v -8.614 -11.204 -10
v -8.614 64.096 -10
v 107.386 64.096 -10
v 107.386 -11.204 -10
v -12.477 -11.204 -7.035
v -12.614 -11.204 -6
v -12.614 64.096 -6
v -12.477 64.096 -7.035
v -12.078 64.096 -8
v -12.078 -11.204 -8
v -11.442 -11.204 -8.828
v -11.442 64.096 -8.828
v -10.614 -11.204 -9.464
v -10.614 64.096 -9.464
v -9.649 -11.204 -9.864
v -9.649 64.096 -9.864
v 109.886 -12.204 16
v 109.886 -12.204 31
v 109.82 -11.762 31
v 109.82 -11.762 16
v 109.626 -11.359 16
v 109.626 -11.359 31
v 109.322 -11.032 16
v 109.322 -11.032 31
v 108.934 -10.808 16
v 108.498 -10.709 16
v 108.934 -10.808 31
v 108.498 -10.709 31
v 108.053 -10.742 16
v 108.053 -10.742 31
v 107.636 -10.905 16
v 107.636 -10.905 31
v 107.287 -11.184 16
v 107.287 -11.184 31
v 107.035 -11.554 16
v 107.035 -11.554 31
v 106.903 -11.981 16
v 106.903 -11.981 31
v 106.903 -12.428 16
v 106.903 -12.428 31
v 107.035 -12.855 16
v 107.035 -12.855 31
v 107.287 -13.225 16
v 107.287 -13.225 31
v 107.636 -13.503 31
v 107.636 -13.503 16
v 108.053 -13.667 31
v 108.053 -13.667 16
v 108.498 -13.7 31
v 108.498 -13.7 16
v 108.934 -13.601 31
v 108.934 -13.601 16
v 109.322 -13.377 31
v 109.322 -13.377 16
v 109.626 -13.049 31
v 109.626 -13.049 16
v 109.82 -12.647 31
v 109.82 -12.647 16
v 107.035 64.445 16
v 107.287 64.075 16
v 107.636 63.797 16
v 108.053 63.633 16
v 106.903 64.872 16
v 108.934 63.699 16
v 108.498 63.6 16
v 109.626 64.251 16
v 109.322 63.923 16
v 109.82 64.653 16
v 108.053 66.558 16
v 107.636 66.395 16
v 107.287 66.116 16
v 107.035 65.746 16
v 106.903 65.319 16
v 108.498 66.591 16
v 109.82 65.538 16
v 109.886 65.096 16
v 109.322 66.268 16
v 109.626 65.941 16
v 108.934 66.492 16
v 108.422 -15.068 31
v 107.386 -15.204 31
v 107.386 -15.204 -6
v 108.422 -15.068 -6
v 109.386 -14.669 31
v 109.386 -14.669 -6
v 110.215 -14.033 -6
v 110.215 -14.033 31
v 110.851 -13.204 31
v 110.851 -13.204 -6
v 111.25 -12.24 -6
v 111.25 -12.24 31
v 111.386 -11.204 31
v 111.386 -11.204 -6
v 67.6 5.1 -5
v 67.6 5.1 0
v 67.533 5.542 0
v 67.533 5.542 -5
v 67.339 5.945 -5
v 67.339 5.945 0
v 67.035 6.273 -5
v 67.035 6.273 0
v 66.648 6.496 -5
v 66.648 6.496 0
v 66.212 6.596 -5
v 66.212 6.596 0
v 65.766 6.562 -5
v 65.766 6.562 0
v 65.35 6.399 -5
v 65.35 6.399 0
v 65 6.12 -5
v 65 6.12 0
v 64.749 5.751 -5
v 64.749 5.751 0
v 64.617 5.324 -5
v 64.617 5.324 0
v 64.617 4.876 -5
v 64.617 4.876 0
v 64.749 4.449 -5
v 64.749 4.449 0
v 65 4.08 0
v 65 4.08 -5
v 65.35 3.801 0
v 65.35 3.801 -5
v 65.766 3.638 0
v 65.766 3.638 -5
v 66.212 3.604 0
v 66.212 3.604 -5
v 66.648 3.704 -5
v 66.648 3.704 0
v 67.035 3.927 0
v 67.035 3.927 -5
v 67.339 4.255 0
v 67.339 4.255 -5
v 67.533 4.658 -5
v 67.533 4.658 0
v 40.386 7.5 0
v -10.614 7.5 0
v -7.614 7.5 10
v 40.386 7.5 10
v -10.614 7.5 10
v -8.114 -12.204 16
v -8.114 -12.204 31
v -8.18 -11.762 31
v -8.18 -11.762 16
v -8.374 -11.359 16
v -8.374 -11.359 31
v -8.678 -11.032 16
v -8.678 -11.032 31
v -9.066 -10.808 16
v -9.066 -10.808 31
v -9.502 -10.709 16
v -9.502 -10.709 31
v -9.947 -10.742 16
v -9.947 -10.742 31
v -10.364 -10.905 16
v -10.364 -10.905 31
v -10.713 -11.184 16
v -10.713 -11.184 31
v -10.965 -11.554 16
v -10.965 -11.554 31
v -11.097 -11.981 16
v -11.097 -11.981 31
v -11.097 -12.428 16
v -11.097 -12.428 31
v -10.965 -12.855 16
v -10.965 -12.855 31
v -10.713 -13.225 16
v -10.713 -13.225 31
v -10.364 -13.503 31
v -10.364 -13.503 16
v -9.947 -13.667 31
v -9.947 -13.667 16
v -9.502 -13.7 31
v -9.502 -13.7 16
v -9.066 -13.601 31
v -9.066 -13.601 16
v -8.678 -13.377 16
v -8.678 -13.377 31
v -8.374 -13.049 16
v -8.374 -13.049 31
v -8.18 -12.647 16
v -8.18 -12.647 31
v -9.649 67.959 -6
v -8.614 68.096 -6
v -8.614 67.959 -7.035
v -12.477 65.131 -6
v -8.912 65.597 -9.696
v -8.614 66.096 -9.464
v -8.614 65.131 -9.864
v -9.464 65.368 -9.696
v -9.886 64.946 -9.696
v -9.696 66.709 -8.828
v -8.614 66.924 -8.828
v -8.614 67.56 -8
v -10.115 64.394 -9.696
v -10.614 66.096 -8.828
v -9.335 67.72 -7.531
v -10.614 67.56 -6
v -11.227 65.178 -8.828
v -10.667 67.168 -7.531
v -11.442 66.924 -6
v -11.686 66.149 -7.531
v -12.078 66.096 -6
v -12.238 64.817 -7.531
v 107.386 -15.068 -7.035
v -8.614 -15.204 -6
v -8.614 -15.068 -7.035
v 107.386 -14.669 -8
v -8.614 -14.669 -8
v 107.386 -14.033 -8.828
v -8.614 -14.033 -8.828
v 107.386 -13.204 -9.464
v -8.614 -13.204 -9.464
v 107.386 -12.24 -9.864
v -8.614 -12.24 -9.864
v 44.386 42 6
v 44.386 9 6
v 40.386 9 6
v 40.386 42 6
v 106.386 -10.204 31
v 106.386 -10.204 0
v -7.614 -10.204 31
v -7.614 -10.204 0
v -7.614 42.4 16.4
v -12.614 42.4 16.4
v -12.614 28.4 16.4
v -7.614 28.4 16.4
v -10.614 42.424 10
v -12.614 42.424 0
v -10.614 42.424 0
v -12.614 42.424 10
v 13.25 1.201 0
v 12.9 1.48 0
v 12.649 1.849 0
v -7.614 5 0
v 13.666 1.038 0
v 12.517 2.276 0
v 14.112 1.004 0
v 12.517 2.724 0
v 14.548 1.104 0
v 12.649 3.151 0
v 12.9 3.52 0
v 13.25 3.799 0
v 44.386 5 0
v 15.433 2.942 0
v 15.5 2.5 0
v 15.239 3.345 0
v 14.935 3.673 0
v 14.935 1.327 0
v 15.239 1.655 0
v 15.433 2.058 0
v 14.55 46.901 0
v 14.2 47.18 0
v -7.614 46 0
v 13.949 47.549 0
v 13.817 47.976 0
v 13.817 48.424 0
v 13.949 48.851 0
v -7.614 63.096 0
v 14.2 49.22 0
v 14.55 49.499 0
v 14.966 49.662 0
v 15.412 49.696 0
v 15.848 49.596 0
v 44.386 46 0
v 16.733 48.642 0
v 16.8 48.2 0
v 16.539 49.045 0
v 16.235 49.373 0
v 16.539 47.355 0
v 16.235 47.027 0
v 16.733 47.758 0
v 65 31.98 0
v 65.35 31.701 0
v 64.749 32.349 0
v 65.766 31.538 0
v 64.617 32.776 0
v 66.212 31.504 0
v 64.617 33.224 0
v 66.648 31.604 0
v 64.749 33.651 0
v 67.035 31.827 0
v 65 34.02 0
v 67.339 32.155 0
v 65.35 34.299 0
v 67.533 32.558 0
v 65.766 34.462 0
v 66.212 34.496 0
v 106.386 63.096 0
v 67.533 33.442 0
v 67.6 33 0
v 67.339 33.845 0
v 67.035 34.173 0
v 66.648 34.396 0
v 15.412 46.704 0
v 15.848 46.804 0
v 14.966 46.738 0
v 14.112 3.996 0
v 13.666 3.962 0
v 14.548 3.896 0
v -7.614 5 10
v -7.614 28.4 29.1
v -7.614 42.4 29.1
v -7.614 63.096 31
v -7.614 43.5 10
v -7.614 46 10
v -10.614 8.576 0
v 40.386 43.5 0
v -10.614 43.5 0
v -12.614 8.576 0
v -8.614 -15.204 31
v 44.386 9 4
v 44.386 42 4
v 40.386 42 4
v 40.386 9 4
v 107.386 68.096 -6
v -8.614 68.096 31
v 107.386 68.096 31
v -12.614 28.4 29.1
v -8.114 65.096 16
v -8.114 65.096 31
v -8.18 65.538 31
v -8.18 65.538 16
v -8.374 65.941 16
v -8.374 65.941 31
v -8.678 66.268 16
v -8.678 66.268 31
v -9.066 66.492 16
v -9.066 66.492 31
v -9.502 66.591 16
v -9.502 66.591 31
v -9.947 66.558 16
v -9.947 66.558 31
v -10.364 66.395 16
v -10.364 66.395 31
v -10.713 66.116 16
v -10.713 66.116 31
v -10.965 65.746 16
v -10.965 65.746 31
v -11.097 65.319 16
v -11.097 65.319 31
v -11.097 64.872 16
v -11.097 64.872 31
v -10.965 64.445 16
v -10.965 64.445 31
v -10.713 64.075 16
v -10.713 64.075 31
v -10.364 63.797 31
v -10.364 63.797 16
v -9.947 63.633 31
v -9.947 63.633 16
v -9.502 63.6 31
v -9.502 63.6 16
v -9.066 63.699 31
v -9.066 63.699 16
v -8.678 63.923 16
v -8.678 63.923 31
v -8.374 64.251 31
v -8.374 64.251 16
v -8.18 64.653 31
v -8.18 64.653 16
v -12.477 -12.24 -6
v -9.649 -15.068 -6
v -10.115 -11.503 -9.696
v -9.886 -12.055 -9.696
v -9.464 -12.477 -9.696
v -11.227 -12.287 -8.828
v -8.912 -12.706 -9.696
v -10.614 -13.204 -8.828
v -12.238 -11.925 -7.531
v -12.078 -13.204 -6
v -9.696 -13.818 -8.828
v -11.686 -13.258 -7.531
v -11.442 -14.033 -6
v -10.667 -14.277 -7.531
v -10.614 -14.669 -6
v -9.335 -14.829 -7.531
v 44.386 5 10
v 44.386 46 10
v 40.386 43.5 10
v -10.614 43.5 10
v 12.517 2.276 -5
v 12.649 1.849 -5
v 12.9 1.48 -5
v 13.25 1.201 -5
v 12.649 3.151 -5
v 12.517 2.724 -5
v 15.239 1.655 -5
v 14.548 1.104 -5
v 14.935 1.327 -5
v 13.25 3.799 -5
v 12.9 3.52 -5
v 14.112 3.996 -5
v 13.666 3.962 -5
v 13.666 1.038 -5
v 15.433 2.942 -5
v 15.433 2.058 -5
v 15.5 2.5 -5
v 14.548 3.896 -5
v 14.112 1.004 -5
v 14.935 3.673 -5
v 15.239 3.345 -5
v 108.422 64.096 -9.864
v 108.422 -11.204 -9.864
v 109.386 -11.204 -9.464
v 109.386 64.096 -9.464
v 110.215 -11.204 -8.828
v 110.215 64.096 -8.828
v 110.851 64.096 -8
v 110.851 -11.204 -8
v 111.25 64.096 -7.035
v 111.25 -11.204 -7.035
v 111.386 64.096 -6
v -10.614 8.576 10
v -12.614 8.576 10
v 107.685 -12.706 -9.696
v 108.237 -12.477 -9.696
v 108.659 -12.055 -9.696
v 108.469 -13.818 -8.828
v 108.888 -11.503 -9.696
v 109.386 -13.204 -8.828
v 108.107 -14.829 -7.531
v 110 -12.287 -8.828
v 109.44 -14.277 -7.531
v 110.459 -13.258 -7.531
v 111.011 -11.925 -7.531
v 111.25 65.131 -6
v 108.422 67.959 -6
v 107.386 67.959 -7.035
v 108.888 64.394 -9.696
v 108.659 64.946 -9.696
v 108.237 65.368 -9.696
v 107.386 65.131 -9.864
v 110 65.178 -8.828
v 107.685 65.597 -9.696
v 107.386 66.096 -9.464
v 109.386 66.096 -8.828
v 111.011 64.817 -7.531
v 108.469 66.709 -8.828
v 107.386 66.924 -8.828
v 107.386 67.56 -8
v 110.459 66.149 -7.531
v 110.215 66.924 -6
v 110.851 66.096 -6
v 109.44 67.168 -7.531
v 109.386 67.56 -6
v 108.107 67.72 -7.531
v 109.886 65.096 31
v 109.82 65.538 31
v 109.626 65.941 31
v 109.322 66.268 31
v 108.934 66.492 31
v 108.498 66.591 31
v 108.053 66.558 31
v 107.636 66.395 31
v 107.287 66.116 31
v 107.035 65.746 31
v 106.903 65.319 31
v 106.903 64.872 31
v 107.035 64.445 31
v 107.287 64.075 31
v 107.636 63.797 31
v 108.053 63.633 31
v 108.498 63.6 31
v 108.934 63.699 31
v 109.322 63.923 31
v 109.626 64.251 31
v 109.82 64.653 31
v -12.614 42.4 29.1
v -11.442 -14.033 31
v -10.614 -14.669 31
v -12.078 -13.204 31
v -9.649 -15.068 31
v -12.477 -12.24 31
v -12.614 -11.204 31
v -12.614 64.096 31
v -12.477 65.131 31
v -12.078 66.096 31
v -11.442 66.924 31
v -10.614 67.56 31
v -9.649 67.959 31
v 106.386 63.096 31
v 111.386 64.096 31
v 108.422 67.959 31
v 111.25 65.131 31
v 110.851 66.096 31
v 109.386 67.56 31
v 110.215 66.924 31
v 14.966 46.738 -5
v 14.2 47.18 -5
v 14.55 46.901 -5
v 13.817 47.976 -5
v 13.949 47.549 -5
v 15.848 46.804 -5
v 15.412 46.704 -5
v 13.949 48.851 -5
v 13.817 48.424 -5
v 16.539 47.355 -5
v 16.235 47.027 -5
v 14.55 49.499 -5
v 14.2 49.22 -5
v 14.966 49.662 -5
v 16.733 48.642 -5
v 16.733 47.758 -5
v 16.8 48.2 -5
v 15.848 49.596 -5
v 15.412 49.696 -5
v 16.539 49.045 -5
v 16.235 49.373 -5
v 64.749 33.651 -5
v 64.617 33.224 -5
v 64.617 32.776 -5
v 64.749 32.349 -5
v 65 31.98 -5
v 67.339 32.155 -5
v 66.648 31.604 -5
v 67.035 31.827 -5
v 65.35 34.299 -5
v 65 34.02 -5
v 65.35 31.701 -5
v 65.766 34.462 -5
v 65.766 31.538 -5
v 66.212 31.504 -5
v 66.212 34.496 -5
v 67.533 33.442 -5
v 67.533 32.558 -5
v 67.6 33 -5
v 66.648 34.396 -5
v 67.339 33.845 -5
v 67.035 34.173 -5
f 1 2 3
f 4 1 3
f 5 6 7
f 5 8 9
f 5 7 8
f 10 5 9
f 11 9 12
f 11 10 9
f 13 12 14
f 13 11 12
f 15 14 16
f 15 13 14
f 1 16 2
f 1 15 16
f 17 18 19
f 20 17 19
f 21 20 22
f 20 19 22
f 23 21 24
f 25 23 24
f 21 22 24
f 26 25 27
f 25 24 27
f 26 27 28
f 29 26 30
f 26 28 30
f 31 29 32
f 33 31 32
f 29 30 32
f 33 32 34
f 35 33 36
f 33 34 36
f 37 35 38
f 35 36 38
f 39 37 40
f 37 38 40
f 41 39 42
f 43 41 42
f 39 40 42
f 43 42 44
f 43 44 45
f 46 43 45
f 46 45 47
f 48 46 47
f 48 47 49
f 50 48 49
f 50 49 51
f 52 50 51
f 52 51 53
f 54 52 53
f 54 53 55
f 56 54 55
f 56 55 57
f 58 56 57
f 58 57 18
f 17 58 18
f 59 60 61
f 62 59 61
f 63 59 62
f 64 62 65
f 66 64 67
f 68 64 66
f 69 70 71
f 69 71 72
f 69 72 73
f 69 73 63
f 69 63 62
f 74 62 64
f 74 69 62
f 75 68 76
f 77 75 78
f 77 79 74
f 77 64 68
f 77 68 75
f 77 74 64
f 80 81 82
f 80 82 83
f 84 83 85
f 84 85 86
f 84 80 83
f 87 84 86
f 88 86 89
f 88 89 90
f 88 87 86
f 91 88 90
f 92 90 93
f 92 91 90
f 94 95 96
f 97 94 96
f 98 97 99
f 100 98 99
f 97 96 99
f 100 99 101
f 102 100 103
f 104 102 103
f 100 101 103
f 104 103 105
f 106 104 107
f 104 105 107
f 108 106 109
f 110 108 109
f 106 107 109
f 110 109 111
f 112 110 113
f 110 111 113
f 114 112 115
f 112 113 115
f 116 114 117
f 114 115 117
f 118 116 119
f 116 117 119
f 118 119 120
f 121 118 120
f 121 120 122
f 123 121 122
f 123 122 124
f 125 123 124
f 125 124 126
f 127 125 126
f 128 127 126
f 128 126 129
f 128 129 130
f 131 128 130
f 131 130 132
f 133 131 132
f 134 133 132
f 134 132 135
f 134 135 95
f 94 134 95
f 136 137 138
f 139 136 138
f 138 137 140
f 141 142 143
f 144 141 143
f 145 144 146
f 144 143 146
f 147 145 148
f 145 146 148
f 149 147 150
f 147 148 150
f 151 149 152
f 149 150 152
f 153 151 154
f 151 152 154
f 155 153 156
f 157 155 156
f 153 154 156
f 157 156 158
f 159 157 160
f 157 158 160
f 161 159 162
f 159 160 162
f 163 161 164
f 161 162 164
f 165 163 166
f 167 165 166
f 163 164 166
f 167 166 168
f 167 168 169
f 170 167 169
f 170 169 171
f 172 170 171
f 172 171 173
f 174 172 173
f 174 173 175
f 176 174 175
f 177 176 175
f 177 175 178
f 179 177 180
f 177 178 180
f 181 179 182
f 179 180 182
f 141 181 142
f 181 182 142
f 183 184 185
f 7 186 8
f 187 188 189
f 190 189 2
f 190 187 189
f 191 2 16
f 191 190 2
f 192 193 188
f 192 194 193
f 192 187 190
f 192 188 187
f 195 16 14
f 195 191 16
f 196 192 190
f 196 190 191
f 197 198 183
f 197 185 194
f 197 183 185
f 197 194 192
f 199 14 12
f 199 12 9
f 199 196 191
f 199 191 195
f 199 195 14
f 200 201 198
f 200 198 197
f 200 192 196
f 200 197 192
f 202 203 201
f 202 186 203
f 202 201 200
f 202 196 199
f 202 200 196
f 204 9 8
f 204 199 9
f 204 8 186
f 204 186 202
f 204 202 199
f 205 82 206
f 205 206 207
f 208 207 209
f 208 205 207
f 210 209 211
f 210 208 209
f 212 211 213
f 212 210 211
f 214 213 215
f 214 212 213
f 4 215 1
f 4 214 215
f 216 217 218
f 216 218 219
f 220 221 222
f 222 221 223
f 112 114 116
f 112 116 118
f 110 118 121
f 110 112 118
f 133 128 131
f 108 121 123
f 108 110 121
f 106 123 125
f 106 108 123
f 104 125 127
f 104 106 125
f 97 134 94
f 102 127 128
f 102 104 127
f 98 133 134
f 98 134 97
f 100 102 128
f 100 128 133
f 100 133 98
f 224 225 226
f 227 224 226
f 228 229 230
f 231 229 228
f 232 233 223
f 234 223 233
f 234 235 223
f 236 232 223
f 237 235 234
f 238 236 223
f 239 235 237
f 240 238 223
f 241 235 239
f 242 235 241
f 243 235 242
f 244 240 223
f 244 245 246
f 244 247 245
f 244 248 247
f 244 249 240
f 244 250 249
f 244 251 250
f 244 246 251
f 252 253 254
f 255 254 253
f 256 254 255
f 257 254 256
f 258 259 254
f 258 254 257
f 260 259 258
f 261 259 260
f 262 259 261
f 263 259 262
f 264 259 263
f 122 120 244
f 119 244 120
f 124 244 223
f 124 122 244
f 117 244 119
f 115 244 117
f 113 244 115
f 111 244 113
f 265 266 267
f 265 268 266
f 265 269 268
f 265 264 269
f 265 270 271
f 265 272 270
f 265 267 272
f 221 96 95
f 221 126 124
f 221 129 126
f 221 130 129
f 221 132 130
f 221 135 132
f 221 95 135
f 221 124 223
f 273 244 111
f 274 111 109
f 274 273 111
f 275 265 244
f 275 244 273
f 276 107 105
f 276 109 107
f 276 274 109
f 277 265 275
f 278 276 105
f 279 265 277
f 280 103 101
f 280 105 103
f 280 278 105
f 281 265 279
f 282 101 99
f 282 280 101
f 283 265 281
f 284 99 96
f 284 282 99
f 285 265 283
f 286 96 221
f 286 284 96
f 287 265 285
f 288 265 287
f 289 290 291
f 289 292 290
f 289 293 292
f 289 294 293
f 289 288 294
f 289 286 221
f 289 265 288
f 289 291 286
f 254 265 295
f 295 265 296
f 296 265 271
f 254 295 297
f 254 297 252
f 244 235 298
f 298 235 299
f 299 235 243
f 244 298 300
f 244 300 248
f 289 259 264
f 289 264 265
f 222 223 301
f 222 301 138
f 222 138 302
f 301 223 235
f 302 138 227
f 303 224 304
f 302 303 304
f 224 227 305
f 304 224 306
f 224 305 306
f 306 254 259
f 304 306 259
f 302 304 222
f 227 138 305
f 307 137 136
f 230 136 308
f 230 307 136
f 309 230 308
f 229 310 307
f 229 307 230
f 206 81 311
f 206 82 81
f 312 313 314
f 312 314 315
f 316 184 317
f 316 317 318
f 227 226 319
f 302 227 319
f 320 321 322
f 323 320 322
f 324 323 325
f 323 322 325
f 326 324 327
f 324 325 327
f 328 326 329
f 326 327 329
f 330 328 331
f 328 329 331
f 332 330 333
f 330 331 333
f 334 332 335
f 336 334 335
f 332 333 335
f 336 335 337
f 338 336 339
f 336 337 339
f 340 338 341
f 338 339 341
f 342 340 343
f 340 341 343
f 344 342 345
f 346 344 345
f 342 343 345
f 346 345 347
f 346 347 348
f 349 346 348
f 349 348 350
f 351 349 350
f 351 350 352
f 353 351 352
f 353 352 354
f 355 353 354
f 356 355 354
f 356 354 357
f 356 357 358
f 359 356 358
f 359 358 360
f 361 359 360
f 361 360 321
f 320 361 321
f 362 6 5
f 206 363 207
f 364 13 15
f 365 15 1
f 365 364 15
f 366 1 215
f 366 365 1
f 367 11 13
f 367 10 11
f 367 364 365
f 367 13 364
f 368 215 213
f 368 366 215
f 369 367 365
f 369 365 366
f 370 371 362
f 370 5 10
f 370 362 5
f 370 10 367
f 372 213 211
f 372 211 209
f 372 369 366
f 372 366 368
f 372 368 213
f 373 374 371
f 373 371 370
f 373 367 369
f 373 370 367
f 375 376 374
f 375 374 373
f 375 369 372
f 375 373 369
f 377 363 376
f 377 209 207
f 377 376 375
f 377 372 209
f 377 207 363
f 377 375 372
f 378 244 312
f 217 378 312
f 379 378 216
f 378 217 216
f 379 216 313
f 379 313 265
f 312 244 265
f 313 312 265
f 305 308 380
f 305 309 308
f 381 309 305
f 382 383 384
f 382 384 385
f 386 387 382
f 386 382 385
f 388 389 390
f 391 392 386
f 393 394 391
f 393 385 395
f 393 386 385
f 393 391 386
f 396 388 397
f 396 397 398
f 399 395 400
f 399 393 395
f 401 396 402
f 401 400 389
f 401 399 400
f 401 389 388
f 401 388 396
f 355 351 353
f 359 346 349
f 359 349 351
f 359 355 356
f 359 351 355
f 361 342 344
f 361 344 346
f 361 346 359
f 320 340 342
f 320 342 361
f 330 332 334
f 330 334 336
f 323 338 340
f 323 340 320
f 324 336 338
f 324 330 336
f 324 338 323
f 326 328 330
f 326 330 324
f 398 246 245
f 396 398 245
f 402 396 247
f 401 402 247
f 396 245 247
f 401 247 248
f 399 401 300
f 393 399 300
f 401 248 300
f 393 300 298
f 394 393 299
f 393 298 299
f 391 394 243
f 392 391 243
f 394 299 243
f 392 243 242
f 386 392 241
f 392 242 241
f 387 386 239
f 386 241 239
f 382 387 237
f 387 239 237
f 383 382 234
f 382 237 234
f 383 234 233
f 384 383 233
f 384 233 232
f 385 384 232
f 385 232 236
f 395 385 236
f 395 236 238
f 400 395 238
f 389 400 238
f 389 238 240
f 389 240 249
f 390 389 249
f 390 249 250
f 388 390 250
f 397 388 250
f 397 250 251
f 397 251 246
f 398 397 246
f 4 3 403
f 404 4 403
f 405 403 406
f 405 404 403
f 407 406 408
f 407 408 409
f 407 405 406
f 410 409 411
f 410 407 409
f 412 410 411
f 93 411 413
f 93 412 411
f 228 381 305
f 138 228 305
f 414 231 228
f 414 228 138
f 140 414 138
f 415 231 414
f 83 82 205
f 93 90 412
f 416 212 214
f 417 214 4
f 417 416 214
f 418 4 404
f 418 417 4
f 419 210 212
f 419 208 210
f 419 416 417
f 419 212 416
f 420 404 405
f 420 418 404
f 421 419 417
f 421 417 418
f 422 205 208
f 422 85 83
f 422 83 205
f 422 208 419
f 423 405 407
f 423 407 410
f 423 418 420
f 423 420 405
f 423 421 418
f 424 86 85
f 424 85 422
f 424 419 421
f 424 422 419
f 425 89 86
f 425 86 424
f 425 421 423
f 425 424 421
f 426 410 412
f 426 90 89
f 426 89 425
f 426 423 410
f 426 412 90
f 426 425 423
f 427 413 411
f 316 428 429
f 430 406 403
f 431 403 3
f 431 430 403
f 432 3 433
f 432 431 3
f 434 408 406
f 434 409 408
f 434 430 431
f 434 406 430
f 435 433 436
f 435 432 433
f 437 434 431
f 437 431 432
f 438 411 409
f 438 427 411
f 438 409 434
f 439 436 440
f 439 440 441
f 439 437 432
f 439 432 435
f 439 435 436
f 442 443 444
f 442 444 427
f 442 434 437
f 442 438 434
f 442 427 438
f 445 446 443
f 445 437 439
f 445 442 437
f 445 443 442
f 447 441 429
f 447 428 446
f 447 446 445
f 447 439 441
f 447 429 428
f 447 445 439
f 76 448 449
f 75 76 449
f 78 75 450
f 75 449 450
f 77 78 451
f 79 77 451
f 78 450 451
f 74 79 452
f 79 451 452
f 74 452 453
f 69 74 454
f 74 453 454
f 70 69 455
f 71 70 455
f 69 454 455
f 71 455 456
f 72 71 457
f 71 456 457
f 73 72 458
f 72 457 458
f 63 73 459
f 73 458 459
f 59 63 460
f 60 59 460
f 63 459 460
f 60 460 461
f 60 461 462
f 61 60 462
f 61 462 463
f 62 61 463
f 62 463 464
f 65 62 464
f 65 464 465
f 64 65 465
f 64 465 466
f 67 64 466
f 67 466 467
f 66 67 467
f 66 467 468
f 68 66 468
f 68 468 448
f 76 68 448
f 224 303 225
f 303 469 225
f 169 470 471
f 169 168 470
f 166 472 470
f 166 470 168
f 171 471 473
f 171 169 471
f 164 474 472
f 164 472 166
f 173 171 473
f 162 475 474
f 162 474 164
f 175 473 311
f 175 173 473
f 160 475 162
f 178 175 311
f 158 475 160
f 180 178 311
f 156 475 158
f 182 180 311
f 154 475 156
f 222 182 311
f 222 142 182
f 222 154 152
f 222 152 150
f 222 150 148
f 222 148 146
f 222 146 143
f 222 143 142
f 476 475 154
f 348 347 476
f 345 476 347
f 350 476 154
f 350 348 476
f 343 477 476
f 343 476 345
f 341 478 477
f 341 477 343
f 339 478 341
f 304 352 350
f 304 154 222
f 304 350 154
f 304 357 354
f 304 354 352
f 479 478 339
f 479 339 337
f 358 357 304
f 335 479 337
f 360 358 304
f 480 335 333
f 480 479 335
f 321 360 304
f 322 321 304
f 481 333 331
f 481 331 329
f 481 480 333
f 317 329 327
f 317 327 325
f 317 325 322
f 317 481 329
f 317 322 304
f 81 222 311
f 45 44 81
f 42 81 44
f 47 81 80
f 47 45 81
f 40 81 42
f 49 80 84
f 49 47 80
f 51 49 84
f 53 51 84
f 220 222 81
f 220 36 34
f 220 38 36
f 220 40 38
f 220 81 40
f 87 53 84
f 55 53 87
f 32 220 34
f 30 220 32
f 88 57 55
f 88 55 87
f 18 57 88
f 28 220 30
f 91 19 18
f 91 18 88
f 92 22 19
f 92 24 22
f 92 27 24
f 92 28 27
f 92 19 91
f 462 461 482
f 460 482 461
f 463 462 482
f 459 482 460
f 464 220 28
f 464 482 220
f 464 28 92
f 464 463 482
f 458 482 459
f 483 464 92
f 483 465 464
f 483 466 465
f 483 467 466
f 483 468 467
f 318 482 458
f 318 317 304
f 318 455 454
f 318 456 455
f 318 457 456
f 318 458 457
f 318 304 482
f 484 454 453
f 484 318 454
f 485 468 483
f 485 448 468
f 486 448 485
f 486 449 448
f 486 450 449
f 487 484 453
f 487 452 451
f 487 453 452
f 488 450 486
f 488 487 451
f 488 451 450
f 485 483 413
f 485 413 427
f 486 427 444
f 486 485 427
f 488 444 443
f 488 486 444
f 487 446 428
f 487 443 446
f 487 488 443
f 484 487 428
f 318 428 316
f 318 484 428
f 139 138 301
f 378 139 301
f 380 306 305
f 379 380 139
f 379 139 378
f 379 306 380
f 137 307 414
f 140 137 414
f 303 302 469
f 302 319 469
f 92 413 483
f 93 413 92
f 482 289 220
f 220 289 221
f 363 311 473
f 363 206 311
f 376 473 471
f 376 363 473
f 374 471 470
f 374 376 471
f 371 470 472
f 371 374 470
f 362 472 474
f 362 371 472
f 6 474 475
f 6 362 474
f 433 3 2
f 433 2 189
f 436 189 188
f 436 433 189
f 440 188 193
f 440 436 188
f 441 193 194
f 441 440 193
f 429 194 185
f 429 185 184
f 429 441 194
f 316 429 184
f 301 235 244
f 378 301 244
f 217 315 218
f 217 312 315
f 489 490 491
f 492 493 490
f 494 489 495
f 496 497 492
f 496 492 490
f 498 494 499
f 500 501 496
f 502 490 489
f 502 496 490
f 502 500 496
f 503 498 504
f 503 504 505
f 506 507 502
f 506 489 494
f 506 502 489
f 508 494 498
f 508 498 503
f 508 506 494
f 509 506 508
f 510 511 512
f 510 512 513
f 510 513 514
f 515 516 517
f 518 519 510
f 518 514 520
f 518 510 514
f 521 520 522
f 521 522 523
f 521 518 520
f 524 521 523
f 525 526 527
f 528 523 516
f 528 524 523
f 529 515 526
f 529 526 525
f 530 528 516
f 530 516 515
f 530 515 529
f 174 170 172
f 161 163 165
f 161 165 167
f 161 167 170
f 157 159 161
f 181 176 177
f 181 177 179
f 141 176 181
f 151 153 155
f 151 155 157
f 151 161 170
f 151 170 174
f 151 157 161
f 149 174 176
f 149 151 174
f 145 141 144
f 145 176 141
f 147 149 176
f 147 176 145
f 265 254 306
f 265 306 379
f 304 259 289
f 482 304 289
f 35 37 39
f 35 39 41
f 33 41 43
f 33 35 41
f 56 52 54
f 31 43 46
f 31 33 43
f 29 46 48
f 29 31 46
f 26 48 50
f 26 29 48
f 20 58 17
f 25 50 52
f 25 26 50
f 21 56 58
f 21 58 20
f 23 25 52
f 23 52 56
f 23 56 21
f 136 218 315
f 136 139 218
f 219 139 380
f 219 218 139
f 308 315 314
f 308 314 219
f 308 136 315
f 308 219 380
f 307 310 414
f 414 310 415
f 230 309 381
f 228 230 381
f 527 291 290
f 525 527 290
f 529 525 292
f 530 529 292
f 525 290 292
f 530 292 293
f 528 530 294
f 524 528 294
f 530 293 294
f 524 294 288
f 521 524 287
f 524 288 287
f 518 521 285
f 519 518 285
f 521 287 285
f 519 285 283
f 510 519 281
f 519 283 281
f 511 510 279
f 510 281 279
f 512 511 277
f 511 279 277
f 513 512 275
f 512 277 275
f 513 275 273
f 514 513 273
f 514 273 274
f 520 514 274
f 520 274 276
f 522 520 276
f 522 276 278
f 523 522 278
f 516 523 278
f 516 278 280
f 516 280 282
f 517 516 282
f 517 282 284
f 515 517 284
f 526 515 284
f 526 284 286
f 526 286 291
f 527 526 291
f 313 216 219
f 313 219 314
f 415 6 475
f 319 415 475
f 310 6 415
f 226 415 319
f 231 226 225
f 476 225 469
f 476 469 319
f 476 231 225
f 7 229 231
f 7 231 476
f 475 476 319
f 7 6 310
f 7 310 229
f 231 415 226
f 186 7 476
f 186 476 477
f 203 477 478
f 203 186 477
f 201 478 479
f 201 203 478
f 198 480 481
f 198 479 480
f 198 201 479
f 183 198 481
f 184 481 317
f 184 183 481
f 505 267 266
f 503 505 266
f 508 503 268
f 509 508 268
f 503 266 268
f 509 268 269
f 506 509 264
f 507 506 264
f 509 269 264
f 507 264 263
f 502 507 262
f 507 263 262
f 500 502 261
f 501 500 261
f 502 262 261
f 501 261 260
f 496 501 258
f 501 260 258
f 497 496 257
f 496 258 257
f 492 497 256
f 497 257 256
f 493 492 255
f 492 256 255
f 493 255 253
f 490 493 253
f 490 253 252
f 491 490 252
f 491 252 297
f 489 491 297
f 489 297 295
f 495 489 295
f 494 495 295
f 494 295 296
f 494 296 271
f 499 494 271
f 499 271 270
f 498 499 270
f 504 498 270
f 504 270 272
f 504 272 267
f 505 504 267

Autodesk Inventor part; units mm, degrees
ref_plane "YZ Plane" through (0, 0, 0) normal (1, 0, 0) x (0, 1, 0)
ref_plane "XZ Plane" through (0, 0, 0) normal (0, 1, 0) x (-1, 0, 0)
ref_plane "XY Plane" through (0, 0, 0) normal (0, 0, 1) x (1, 0, 0)
sketch "Arduino Uno" plane through (0, 0, 0) normal (0, 0, 1) x (1, 0, 0)
  line L0 (0, 0) -> (68.6, 0)
  line L1 (68.6, 0) -> (68.6, 53.3)
  line L2 (68.6, 53.3) -> (0, 53.3)
  line L3 (0, 53.3) -> (0, 0)
  circle A0 centre (14, 2.5) radius 1.5
  circle A1 centre (66.1, 5.1) radius 1.5
  circle A2 centre (66.1, 33) radius 1.5
  circle A3 centre (15.3, 48.2) radius 1.5
  dimension "d6" = 68.6
  dimension "d7" = 53.3
  dimension "d97" = 3
  dimension "d98" = 14
  dimension "d99" = 2.5
  dimension "d100" = 3
  dimension "d101" = 5.1
  dimension "d102" = 66.1
  dimension "d103" = 33
  dimension "d105" = 66.1
  dimension "d106" = 3
  dimension "d107" = 3
  dimension "d108" = 48.2
  dimension "d109" = 15.3
sketch "Sketch2" plane through (0, 0, 0) normal (0, 0, 1) x (1, 0, 0)
  line L0 (-7.6136, -10.2044) -> (-7.6136, 63.0956)
  line L1 (-7.6136, 63.0956) -> (106.3864, 63.0956)
  line L2 (106.3864, 63.0956) -> (106.3864, -10.2044)
  line L3 (106.3864, -10.2044) -> (-7.6136, -10.2044)
  dimension "d29" = 114
  dimension "d39" = 73.3
extrude "Back Plate" add sketch "Sketch2" against normal blind 10
extrude "Uno Mounting Holes" cut sketch "Arduino Uno" against normal blind 5 contours A0 | A1 | A2 | A3
sketch "3.5\" TFT LCD Screen" plane through (0, 0, 0) normal (0, 0, 1) x (1, 0, 0)
  line L0 (88.6005, 0.0003) -> (88.6005, 53.3003)
  line L1 (88.6005, 53.3003) -> (10.6005, 53.3003)
  line L2 (10.6005, 53.3003) -> (10.6005, 0.0003)
  line L3 (10.6005, 0.0003) -> (88.6005, 0.0003)
  line L4 (-7.6136, -10.2044) -> (-7.6136, 63.0956) projected
  line L5 (106.3864, -10.2044) -> (-7.6136, -10.2044) projected
  line L6 (106.3864, 63.0956) -> (106.3864, -10.2044) projected
  line L7 (-7.6136, 63.0956) -> (106.3864, 63.0956) projected
  point P0 (0, 0)
  point P1 (68.6, 0)
  dimension "d35" = 78
  dimension "d36" = 53.3
  dimension "d37" = 78
  dimension "d38" = 53.3
sketch "SD Card Slot" plane through (0, 0, 0) normal (0, 0, 1) x (1, 0, 0)
  line L0 (43.3864, 9.1) -> (-7.6136, 9.1)
  line L1 (-7.6136, 9.1) -> (-7.6136, 44.1)
  line L2 (-7.6136, 44.1) -> (43.3864, 44.1)
  line L3 (43.3864, 44.1) -> (43.3864, 9.1)
  circle A0 centre (14, 2.5) radius 1.6 projected
  line L4 (-7.6136, -10.2044) -> (-7.6136, 63.0956) projected
  circle A1 centre (15.3, 50.7) radius 1.6 projected
  point P0 (0, 0)
  dimension "d41" = 35
  dimension "d42" = 51
  dimension "d44" = 6.6
  dimension "d45" = 0
sketch "Sketch5" plane through (0, 0, 0) normal (0, 0, 1) x (1, 0, 0)
  line L0 (43.3864, 9.1) -> (-7.6136, 9.1) projected
  line L1 (43.3864, 44.1) -> (43.3864, 9.1) projected
  line L2 (-7.6136, 44.1) -> (43.3864, 44.1) projected
  line L3 (-7.6136, 9.1) -> (-7.6136, 44.1) projected
  line L4 (40.3864, 7.5) -> (40.3864, 43.5)
  line L5 (40.3864, 7.5) -> (-7.6136, 7.5)
  line L6 (-7.6136, -10.2044) -> (-7.6136, 63.0956) projected
  line L7 (40.3864, 43.5) -> (-7.6136, 43.5)
  line L8 (-7.6136, 43.5) -> (-7.6136, 46)
  line L9 (-7.6136, 46) -> (44.3864, 46)
  line L10 (-7.6136, 7.5) -> (-7.6136, 5)
  line L11 (-7.6136, 5) -> (44.3864, 5)
  line L12 (44.3864, 5) -> (44.3864, 46)
  circle A0 centre (15.3, 48.2) radius 1.5 projected
  circle A1 centre (14, 2.5) radius 1.5 projected
  point P0 (0, 0)
  dimension "d47" = 2.5
  dimension "d48" = 52
  dimension "d49" = 2.5
  dimension "d115" = 41
  dimension "d116" = 36
  dimension "d117" = 1
extrude "SD Card Slot Slot" add sketch "Sketch5" along normal blind 10 contours L1 L2 L6 L9 L12 L11 L5 L4 L0 | L0 L4 L7 L3 L2 L1
sketch "Sketch6" plane through (44.3864, 5, 0) normal (1, 0, 0) x (0, 0, -1)
  line L0 (0, 41) -> (0, 0) projected
  line L1 (0, 41) -> (-10, 41) projected
  line L2 (-10, 0) -> (-10, 41) projected
  line L3 (0, 0) -> (-10, 0) projected
  line L4 (-6, 37) -> (-4, 37)
  line L5 (-4, 37) -> (-4, 4)
  line L6 (-4, 4) -> (-6, 4)
  line L7 (-6, 4) -> (-6, 37)
  point P0 (0, -5)
  dimension "d52" = 4
extrude "SD Ribbon Slot" cut sketch "Sketch6" against normal through all contours L4 L5 L6 L7
fillet "1.2mm Fillet" [suppressed]
sketch "Sketch7" plane through (0, 0, 0) normal (0, 0, 1) x (1, 0, 0)
  line L0 (106.3864, -10.2044) -> (101.3864, -10.2044)
  line L1 (101.3864, -10.2044) -> (101.3864, -5.2044)
  line L2 (101.3864, -5.2044) -> (106.3864, -5.2044)
  line L3 (106.3864, -5.2044) -> (106.3864, -10.2044)
  line L4 (49.3864, -10.2044) -> (49.3864, 80.0118)
  line L5 (-7.6136, 63.0956) -> (106.3864, 63.0956) projected
  line L6 (106.3864, 26.4456) -> (-34.6963, 26.4456)
  line L7 (-7.6136, -10.2044) -> (-2.6136, -10.2044)
  line L8 (-2.6136, -10.2044) -> (-2.6136, -5.2044)
  line L9 (-2.6136, -5.2044) -> (-7.6136, -5.2044)
  line L10 (-7.6136, -5.2044) -> (-7.6136, -10.2044)
  line L11 (106.3864, 63.0956) -> (101.3864, 63.0956)
  line L12 (101.3864, 63.0956) -> (101.3864, 58.0956)
  line L13 (101.3864, 58.0956) -> (106.3864, 58.0956)
  line L14 (106.3864, 58.0956) -> (106.3864, 63.0956)
  line L15 (-7.6136, 63.0956) -> (-2.6136, 63.0956)
  line L16 (-2.6136, 63.0956) -> (-2.6136, 58.0956)
  line L17 (-2.6136, 58.0956) -> (-7.6136, 58.0956)
  line L18 (-7.6136, 58.0956) -> (-7.6136, 63.0956)
  point P0 (0, 0)
  point P1 (0, 52.8913)
  dimension "d56" = 5
  dimension "d57" = 5
  dimension "d58" = 57
  dimension "d59" = 36.65
extrude "Pillars" [suppressed]
sketch "Sketch8" plane through (0, 0, 31) normal (0, 0, 1) x (1, 0, 0)
  line L0 (101.3864, -10.2044) -> (-2.6136, -10.2044) projected
  line L1 (-7.6136, -5.2044) -> (-2.6136, -5.2044) projected
  line L2 (101.3864, -10.2044) -> (-2.6136, -10.2044)
  line L3 (-2.6136, -10.2044) -> (-2.6136, -5.2044)
  line L4 (-2.6136, -5.2044) -> (101.3864, -5.2044)
  line L5 (101.3864, -5.2044) -> (101.3864, -10.2044)
  line L6 (101.3864, 63.0956) -> (101.3864, 58.0956) projected
  line L7 (106.3864, 63.0956) -> (106.3864, -10.2044) projected
  line L8 (101.3864, 58.0956) -> (106.3864, 58.0956)
  line L9 (106.3864, 58.0956) -> (106.3864, -5.2044)
  line L10 (106.3864, -5.2044) -> (101.3864, -5.2044)
  line L11 (101.3864, -5.2044) -> (101.3864, 58.0956)
  line L12 (-7.6136, 58.0956) -> (-2.6136, 58.0956) projected
  line L13 (-7.6136, 63.0956) -> (106.3864, 63.0956) projected
  line L14 (-2.6136, 58.0956) -> (101.3864, 58.0956)
  line L15 (101.3864, 58.0956) -> (101.3864, 63.0956)
  line L16 (101.3864, 63.0956) -> (-2.6136, 63.0956)
  line L17 (-2.6136, 63.0956) -> (-2.6136, 58.0956)
  line L18 (-2.6136, 58.0956) -> (-7.6136, 58.0956)
  line L19 (-7.6136, 58.0956) -> (-7.6136, -5.2044)
  line L20 (-7.6136, -5.2044) -> (-2.6136, -5.2044)
  line L21 (-2.6136, -5.2044) -> (-2.6136, 58.0956)
  point P0 (0, 0)
extrude "Beams (Will they print?)" [suppressed]
sketch "Sketch9" plane through (0, 0, 0) normal (0, 0, 1) x (1, 0, 0)
  line L0 (106.3864, 63.0956) -> (106.3864, -10.2044) projected
  line L1 (-7.6136, -10.2044) -> (-7.6136, 63.0956) projected
  line L2 (106.3864, -10.2044) -> (-7.6136, -10.2044)
  line L3 (-7.6136, -10.2044) -> (-7.6136, 63.0956)
  line L4 (-7.6136, 63.0956) -> (106.3864, 63.0956) projected
  line L5 (-7.6136, 63.0956) -> (106.3864, 63.0956)
  line L6 (106.3864, 63.0956) -> (106.3864, -10.2044)
  line L7 (106.3864, -10.2044) -> (106.3864, -15.2044)
  line L8 (106.3864, -15.2044) -> (-7.6136, -15.2044)
  line L9 (-7.6136, -15.2044) -> (-12.6136, -15.2044)
  line L10 (-12.6136, -15.2044) -> (-12.6136, 63.0956)
  line L11 (-12.6136, 63.0956) -> (-12.6136, 68.0956)
  line L12 (-12.6136, 68.0956) -> (106.3864, 68.0956)
  line L13 (106.3864, 68.0956) -> (111.3864, 68.0956)
  line L14 (111.3864, 68.0956) -> (111.3864, -15.2044)
  line L15 (111.3864, -15.2044) -> (106.3864, -15.2044)
  point P0 (0, 0)
  dimension "d64" = 5
  dimension "d65" = 5
  dimension "d66" = 5
  dimension "d67" = 5
extrude "Outer Walls (5mm Offset)" add sketch "Sketch9" along normal blind 31 and the other way blind 10
extrude "Extrusion9" [suppressed]
sketch "Sketch10" plane through (-12.6136, -15.2044, 31) normal (-1, 0, 0) x (0, 0, 1)
  line L0 (-31, 63.5044) -> (-31, 78.3) projected
  line L1 (-13.6, 56.6044) -> (-2.9, 56.6044)
  line L2 (-2.9, 56.6044) -> (-2.9, 44.6044)
  line L3 (-2.9, 44.6044) -> (-13.6, 44.6044)
  line L4 (-13.6, 44.6044) -> (-13.6, 56.6044)
  line L5 (-1.9, 43.6044) -> (-1.9, 57.6044)
  line L6 (-1.9, 57.6044) -> (-14.6, 57.6044)
  line L7 (-14.6, 57.6044) -> (-14.6, 43.6044)
  line L8 (-14.6, 43.6044) -> (-1.9, 43.6044)
  line L9 (-25, 57.2044) -> (-25, 24.2044) projected
  line L10 (-25, 24.2044) -> (-27, 24.2044) projected
  line L11 (-27, 24.2044) -> (-27, 57.2044) projected
  line L12 (-27, 57.2044) -> (-25, 57.2044) projected
  line L13 (-31, 22.7044) -> (-31, 58.7044) projected
  line L14 (-31, 22.7044) -> (-21, 22.7044) projected
  line L15 (-21, 58.7044) -> (-21, 22.7044) projected
  line L16 (-31, 58.7044) -> (-21, 58.7044) projected
  point P0 (-31, 68.5047)
  dimension "d82" = 10.7
  dimension "d83" = 12
  dimension "d84" = 1
extrude "SD Card Opening" cut sketch "Sketch10" against normal blind 5 contours L1 L2 L3 L4 | L8 L7 L6 L5 | L9 L10 L11 L12 | L13 L16 L15 L14
fillet "4mm Fillet" radius 4 8 edges at (-12.6136, 68.0956, 10.5) (-12.6136, -15.2044, 10.5) (111.3864, -15.2044, 10.5) (111.3864, 68.0956, 10.5) (49.3864, 68.0956, -10) (-12.6136, 26.4456, -10) (49.3864, -15.2044, -10) (111.3864, 26.4456, -10)
sketch "Sketch11" plane through (0, 0, 0) normal (0, 0, 1) x (1, 0, 0)
  line L0 (98.4778, 47.4456) -> (98.4778, 5.4456) construction
  line L1 (98.4778, 5.4456) -> (86.054, 5.4456) construction
  line L2 (86.054, 5.4456) -> (86.054, 47.4456) construction
  line L3 (86.054, 47.4456) -> (98.4778, 47.4456) construction
  line L4 (-8.6136, 68.0956) -> (107.3864, 68.0956) projected
  line L5 (107.3864, 68.0956) -> (107.3864, 26.4456)
  line L6 (107.3864, 26.4456) -> (48.9636, 26.4456)
  point P0 (0, 0)
  dimension "d88" = 41.65
  dimension "d89" = 42
  dimension "d90" = 21
feature "Inside Text" [suppressed]
sketch "Sketch12" plane through (0, 0, 31) normal (0, 0, 1) x (1, 0, 0)
  circle A0 centre (108.3864, -12.2044) radius 1.5
  line L0 (-12.6136, -15.2044) -> (111.3864, -15.2044) projected
  line L1 (111.3864, -15.2044) -> (111.3864, 68.0956) projected
  line L2 (107.3864, -15.2044) -> (-8.6136, -15.2044) projected
  line L3 (49.3864, -15.2044) -> (49.3864, 77.1219)
  line L4 (-8.6136, -11.2044) -> (-12.6136, -11.2044) projected
  line L5 (-12.6136, -11.2044) -> (-12.6136, 26.4456)
  line L6 (-12.6136, -11.2044) -> (-12.6136, 64.0956) projected
  line L7 (-12.6136, 26.4456) -> (133.0429, 26.4456)
  circle A1 centre (-9.6136, -12.2044) radius 1.5
  line L8 (111.3864, 26.4456) -> (-34.2702, 26.4456)
  circle A2 centre (108.3864, 65.0956) radius 1.5
  line L9 (-8.6136, 64.0956) -> (-12.6136, 64.0956)
  circle A3 centre (-9.6136, 65.0956) radius 1.5
  point P0 (0, 0)
  point P1 (111.3864, -11.2044)
  point P2 (111.3864, 64.0956)
  dimension "d91" = 3
  dimension "d92" = 3
  dimension "d93" = 3
  dimension "d94" = 37.65
extrude "3mm Screw Holes" cut sketch "Sketch12" against normal blind 15 contours A0 | A1 | A2 | A3
sketch "Sketch15" plane through (-12.6136, -11.2044, 31) normal (-1, 0, 0) x (0, 0, 1)
  line L0 (-31, 54.7044) -> (-21, 54.7044) projected
  line L1 (-21, 54.7044) -> (-31, 54.7044)
  line L2 (-31, 54.7044) -> (-31, 53.6284)
  line L3 (-31, 53.6284) -> (-21, 53.6284)
  line L4 (-21, 53.6284) -> (-21, 54.7044)
  line L5 (-21, 36.7044) -> (-31, 36.7044)
  line L6 (-31, 18.7044) -> (-21, 18.7044)
  line L7 (-21, 18.7044) -> (-31, 18.7044)
  line L8 (-31, 18.7044) -> (-31, 19.7803)
  line L9 (-31, 19.7803) -> (-21, 19.7803)
  line L10 (-21, 19.7803) -> (-21, 18.7044)
  point P0 (-31, 11.2044)
  dimension "d123" = 18
extrude "Extra Walls" add sketch "Sketch15" against normal blind 2
properties part number "Back Plate test05"
